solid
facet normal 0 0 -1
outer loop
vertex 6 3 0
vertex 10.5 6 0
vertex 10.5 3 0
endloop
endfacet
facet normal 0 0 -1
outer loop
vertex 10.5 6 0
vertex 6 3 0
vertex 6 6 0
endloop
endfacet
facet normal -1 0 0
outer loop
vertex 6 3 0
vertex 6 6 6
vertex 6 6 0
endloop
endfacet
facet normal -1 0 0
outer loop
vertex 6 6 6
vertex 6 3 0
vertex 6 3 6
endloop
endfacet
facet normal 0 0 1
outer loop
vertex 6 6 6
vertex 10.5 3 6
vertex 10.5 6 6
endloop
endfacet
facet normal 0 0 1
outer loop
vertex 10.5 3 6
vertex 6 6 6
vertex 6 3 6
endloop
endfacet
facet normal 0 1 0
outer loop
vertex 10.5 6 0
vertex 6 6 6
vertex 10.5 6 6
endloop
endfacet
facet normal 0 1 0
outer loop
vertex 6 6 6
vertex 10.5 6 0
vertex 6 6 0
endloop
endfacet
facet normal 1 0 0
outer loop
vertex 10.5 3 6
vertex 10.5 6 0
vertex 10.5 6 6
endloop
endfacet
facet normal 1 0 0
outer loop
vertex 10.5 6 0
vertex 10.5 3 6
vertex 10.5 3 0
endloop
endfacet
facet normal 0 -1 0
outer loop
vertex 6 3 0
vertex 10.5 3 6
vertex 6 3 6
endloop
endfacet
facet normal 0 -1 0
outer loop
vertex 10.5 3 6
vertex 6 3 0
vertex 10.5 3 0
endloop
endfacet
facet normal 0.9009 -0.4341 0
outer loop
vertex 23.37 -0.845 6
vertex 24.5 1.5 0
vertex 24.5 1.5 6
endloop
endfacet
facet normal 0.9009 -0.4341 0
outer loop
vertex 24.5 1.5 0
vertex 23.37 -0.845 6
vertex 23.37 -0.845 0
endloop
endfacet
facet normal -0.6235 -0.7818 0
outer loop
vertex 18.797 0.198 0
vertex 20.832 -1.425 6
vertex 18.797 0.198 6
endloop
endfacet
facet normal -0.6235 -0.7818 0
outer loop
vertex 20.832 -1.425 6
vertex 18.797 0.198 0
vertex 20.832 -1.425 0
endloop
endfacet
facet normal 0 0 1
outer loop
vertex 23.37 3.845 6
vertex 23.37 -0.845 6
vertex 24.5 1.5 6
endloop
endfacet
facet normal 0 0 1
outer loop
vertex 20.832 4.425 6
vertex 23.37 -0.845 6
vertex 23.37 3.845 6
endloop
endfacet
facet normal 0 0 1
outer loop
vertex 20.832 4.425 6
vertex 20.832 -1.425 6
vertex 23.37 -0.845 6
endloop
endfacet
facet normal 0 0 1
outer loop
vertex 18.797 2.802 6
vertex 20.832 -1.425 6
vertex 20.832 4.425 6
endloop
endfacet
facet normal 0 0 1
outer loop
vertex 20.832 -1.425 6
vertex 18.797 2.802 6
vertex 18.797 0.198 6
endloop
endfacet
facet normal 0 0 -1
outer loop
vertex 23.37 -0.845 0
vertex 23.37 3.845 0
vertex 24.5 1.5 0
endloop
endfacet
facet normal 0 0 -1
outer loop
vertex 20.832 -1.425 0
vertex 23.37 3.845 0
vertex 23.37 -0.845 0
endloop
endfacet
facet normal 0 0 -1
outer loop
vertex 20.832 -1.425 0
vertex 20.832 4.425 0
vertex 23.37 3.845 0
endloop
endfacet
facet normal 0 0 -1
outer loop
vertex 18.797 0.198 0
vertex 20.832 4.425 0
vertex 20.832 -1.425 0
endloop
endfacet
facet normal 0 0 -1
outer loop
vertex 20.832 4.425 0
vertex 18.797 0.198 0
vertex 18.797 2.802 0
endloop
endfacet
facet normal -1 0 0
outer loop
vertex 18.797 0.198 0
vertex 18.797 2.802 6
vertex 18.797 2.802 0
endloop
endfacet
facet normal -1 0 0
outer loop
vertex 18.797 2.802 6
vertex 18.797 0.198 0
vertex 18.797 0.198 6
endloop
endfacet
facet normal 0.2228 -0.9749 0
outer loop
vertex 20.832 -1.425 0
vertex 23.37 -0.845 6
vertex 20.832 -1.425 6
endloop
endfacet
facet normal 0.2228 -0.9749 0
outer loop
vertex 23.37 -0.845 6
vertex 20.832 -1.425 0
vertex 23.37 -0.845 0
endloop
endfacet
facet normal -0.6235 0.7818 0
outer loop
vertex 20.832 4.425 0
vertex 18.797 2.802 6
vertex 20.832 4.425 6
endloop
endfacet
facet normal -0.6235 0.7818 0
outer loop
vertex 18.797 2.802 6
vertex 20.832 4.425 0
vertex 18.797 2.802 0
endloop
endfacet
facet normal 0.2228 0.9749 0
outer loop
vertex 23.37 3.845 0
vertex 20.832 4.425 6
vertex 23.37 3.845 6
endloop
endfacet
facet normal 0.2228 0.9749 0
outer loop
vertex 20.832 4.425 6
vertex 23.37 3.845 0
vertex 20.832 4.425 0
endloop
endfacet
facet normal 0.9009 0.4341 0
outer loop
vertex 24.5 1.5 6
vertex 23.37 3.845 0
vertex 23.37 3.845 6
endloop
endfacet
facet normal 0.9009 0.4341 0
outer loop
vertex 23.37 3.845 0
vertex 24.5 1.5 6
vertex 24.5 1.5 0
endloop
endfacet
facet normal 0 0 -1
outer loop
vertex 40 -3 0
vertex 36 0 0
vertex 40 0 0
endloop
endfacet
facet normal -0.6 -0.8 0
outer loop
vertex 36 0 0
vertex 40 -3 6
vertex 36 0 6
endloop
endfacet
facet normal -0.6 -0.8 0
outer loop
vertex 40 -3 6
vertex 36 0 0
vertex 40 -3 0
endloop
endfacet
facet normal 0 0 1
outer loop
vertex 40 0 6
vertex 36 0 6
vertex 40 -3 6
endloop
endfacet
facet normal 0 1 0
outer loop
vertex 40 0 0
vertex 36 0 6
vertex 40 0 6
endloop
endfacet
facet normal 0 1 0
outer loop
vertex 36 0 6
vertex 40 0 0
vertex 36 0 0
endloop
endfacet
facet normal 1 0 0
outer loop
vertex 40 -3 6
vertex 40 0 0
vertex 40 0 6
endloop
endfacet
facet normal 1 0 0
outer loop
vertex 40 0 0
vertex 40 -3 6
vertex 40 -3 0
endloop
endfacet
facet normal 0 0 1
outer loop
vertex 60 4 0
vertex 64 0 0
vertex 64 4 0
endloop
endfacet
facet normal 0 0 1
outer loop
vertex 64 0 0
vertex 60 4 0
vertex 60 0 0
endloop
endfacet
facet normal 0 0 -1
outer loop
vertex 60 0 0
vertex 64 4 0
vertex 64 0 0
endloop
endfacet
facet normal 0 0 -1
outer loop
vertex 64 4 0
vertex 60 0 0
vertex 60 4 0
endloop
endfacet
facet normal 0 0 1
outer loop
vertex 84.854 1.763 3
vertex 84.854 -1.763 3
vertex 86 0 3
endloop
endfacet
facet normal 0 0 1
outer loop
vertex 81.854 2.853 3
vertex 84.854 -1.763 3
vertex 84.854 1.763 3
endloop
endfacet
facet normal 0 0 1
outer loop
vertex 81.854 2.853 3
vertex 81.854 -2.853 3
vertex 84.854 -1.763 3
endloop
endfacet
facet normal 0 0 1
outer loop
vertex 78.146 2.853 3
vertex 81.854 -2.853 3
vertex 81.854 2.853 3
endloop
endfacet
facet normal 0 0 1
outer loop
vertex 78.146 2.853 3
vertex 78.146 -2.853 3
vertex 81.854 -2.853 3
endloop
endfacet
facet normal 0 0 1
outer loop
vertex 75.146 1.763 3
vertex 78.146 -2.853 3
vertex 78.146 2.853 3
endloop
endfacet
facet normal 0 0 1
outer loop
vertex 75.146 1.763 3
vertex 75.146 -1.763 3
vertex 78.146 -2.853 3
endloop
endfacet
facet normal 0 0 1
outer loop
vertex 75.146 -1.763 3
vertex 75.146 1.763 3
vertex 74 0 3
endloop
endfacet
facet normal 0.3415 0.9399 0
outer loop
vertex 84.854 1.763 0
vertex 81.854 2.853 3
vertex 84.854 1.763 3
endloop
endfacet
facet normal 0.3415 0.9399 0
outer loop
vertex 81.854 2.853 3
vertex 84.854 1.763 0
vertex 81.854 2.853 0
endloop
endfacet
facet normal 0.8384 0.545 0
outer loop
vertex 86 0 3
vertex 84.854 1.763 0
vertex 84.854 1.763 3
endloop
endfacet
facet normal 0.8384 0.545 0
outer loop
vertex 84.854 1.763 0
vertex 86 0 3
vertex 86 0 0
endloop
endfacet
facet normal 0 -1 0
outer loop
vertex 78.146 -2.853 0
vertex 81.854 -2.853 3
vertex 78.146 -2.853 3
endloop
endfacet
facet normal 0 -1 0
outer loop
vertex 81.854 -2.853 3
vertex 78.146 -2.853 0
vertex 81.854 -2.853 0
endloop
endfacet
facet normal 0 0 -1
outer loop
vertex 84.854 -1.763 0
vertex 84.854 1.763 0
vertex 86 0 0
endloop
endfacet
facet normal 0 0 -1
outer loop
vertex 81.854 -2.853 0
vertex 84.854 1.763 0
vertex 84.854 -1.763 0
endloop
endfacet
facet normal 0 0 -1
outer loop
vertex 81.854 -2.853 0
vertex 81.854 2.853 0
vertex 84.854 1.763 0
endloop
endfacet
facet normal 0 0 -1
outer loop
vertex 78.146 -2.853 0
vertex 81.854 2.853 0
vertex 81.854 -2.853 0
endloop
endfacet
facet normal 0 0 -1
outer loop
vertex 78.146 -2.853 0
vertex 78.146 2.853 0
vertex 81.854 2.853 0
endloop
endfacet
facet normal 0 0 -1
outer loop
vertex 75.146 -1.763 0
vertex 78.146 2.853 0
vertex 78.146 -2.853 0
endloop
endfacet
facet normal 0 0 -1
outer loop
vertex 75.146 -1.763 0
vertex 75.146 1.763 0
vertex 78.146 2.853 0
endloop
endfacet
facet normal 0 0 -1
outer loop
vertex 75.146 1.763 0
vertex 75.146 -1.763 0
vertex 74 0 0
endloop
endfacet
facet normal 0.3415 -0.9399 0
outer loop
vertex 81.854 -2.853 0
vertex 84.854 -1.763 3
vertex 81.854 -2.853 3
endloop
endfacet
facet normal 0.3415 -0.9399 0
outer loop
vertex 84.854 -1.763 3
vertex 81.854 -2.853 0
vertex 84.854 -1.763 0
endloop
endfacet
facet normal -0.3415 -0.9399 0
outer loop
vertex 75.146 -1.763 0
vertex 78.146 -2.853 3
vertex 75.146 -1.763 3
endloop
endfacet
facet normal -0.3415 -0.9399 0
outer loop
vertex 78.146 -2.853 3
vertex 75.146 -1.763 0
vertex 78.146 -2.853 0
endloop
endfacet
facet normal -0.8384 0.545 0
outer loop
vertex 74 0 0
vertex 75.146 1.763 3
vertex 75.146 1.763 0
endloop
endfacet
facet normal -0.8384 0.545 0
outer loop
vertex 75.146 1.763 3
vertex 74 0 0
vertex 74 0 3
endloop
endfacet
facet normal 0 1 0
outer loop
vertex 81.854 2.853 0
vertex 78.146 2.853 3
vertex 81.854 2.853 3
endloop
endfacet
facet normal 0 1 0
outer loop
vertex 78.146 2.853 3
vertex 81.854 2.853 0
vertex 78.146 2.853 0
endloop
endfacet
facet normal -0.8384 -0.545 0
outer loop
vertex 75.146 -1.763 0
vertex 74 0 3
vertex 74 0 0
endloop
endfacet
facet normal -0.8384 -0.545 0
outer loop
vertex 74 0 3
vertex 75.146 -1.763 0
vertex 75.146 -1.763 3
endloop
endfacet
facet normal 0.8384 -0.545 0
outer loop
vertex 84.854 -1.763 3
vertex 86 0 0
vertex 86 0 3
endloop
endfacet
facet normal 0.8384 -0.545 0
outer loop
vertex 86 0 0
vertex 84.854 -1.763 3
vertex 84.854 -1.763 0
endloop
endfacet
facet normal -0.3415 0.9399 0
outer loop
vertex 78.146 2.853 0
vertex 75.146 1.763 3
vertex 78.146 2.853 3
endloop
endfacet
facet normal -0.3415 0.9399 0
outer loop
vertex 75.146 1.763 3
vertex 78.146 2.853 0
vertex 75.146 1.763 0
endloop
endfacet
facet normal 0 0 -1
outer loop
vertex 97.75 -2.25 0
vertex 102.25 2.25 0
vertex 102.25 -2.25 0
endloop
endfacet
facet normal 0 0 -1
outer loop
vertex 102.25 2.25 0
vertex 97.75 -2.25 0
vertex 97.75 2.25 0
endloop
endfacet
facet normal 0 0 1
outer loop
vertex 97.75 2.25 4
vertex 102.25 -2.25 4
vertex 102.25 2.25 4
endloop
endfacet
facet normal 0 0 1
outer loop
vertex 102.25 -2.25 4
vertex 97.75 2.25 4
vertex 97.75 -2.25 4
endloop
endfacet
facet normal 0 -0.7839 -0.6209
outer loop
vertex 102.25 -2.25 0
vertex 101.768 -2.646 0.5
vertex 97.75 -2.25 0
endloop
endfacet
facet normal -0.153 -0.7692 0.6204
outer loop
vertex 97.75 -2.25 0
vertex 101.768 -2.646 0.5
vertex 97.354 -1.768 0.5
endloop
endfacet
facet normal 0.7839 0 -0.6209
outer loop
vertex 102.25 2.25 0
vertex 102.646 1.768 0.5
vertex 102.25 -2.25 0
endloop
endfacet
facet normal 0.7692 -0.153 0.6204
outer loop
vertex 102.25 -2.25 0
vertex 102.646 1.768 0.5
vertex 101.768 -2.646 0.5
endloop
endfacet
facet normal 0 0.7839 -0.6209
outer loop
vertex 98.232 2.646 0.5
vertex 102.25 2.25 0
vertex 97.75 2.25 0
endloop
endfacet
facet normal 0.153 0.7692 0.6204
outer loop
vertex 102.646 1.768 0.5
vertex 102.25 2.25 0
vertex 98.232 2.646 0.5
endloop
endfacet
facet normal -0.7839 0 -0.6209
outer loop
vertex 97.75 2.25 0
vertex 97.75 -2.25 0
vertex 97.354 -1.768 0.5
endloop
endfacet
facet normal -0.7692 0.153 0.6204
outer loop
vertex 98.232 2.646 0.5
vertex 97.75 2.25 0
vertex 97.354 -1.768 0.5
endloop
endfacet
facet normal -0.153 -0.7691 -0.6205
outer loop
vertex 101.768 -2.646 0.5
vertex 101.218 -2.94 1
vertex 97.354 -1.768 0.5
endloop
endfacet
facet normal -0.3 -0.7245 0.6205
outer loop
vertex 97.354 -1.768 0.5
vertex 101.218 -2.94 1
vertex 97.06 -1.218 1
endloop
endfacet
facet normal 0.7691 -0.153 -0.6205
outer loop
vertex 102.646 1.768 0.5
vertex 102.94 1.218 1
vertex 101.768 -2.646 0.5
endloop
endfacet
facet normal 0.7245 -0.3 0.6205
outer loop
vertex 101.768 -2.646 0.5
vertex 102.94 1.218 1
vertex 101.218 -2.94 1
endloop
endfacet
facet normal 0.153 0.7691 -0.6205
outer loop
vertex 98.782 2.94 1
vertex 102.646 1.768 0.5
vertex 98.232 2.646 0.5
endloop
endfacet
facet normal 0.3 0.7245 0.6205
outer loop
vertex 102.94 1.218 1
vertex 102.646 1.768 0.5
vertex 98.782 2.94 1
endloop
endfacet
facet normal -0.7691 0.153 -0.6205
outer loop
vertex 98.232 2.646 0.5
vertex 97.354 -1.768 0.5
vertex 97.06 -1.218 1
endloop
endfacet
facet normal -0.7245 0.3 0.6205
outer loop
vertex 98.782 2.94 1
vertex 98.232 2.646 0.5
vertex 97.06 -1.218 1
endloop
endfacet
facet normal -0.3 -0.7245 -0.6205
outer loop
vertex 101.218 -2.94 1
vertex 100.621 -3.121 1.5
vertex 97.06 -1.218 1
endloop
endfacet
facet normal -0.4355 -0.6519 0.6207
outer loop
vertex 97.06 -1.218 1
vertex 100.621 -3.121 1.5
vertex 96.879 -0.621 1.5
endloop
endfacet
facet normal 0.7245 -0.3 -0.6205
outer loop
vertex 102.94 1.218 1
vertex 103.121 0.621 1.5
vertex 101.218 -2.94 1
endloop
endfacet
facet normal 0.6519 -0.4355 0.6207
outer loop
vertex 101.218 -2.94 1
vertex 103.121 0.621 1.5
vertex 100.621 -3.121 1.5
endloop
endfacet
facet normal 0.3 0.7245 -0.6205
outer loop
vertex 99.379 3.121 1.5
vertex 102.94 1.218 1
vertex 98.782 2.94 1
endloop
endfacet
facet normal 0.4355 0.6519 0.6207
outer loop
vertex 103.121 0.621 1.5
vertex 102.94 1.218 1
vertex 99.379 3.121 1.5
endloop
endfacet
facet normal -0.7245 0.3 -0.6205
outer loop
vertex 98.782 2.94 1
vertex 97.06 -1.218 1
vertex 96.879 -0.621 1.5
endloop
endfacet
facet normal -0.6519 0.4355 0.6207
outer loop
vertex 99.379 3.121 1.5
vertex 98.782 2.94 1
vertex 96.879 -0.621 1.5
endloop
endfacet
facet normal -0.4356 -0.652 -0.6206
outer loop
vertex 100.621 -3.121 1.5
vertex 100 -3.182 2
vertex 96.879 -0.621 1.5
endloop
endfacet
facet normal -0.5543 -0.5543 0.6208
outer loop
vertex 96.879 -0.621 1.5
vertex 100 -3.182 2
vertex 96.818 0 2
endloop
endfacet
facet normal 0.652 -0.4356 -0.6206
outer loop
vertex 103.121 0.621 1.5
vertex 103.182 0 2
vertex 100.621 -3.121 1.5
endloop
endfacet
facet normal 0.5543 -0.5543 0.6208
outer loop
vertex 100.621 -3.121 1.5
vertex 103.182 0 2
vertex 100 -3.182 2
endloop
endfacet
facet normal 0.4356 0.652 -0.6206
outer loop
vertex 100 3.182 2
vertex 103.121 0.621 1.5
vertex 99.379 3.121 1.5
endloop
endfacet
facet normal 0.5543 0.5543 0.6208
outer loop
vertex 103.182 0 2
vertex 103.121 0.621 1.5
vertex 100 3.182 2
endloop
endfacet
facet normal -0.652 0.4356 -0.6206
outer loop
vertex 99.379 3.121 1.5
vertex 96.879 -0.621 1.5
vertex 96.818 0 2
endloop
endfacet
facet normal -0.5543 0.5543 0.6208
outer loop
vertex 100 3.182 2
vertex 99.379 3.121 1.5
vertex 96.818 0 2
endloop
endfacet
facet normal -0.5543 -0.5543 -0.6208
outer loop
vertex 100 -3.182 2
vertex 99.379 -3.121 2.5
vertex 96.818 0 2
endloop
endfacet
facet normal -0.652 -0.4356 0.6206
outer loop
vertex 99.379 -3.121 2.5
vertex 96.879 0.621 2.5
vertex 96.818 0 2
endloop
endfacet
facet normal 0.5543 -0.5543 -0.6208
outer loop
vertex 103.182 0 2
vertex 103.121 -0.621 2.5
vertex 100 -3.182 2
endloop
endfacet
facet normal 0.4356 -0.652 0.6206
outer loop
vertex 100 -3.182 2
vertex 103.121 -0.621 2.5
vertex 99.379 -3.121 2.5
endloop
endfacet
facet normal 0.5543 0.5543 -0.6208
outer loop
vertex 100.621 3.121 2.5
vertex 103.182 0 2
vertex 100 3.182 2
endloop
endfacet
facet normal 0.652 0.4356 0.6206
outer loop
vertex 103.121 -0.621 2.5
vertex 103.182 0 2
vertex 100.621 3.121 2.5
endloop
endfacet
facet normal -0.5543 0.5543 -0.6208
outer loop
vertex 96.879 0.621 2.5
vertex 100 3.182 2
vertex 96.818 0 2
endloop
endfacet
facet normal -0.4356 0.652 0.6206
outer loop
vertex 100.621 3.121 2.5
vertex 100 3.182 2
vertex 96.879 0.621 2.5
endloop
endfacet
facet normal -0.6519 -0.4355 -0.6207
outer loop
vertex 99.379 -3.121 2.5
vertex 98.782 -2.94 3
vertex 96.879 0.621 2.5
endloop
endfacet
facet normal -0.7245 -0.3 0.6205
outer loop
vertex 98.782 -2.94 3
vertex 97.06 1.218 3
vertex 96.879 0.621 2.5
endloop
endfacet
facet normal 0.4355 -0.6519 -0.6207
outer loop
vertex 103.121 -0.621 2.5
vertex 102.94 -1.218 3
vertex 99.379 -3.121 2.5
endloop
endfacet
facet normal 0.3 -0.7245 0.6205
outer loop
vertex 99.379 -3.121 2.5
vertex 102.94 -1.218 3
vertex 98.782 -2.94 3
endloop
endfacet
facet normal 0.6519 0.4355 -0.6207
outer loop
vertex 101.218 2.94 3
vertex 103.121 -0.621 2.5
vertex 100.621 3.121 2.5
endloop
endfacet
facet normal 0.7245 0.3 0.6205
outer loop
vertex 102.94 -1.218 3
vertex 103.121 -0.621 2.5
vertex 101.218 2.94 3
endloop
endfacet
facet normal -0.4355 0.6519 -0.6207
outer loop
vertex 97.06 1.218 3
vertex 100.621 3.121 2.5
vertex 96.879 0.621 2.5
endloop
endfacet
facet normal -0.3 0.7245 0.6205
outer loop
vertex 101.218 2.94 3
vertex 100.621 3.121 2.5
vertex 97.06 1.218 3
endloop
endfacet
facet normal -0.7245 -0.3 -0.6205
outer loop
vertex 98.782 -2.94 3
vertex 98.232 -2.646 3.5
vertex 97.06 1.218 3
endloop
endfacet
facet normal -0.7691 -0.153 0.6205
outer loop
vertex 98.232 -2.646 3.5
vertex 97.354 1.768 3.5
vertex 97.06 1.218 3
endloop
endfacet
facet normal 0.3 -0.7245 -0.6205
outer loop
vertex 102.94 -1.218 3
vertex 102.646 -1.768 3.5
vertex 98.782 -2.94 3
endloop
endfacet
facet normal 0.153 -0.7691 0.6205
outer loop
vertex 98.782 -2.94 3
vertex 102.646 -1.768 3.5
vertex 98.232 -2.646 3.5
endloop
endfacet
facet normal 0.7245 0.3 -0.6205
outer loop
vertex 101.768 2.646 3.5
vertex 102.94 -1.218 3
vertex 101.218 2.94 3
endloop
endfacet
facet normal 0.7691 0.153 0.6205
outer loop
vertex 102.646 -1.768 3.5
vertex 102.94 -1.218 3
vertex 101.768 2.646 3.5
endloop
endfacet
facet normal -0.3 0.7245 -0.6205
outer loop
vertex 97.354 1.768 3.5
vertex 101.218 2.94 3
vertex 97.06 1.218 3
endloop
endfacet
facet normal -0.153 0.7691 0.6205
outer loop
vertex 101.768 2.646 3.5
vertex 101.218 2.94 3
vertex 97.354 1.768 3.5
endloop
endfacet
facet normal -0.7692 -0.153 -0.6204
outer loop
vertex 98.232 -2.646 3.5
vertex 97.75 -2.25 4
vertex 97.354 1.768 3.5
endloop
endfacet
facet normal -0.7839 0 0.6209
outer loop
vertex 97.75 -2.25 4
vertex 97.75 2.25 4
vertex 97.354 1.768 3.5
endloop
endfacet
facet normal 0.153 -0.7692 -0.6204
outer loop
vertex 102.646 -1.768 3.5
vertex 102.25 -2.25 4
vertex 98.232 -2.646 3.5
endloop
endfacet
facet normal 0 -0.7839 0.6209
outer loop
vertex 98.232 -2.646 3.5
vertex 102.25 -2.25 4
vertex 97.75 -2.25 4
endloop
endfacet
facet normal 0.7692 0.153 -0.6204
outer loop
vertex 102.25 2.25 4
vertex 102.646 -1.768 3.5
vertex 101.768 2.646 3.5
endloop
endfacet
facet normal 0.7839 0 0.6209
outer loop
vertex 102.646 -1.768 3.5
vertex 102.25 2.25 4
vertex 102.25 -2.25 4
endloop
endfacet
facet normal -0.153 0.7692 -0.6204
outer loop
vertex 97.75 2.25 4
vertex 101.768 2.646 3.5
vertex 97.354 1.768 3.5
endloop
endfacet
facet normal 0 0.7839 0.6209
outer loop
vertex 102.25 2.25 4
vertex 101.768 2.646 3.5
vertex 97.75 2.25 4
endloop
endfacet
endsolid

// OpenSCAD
// scale([s, s, sz]) over translate() linear_extrude() is folded into a uniform 2D scale and a taller
// extrude, so the prism keeps its planes (a per-axis scale of a finished solid turns every one into a
// BSpline). Fast path: positive factors, the same x and y expression. Everything else must come out
// exactly as the unfolded chain: a negative factor mirrors, a zero removes the part (OpenSCAD's empty),
// unequal x/y and a twisted extrude are not folded at all.
k = 1.5;
t = 3;
scale([k, k, t]) translate([4, 2, 1]) linear_extrude(height = 2, center = true) square([3, 2]);
translate([20, 0, 0]) scale([k, k, t]) { translate([1, 0, 0]) translate([0, 1, 0]) linear_extrude(2) circle(2); }
m = -1;
translate([40, 0, 0]) scale([m, m, 2]) linear_extrude(3) polygon([[0, 0], [4, 0], [0, 3]]);
z = 0;
translate([60, 0, 0]) scale([2, 2, z]) linear_extrude(3) square(2);
translate([80, 0, 0]) scale([2, 1, 1.5]) linear_extrude(2) circle(3);
translate([100, 0, 0]) scale([k, k, 1]) linear_extrude(4, twist = 90, slices = 8) square(3, center = true);
